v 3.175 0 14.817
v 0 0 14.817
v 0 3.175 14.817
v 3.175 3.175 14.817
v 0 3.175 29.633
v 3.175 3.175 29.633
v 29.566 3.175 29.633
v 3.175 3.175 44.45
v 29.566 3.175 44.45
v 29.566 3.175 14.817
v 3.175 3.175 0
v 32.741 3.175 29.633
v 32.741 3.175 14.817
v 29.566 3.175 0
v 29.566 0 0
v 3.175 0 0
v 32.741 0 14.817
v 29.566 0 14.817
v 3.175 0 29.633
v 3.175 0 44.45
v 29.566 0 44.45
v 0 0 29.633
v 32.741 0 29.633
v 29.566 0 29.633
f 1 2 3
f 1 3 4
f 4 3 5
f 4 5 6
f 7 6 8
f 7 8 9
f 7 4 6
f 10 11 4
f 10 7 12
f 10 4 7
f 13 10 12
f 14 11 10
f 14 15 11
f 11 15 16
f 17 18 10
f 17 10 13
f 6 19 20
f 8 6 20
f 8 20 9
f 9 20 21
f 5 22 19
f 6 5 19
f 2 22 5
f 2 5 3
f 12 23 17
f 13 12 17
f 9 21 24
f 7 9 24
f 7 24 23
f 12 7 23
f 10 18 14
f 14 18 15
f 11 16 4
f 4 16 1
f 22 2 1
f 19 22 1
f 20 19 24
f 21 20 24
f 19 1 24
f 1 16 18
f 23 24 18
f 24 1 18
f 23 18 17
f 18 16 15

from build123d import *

# Parameters (mm, degrees)
BOSS_EXTRUDE2_DEPTH = 3.175


with BuildPart() as part:
    # Sketch1 → Boss-Extrude2 (new body)
    with BuildSketch(Plane(origin=(0, 0, 0), x_dir=(1, 0, 0), z_dir=(0, 1, 0))):
        Polygon((0, -29.633333333), (3.175, -29.633333333), (3.175, -44.45), (29.5656, -44.45), (29.5656, -29.633333333), (32.7406, -29.633333333), (32.7406, -14.816666667), (29.5656, -14.816666667), (29.5656, 0), (3.175, 0), (3.175, -14.816666667), (0, -14.816666667), align=None)
    extrude(amount=BOSS_EXTRUDE2_DEPTH)


solid = part.part
